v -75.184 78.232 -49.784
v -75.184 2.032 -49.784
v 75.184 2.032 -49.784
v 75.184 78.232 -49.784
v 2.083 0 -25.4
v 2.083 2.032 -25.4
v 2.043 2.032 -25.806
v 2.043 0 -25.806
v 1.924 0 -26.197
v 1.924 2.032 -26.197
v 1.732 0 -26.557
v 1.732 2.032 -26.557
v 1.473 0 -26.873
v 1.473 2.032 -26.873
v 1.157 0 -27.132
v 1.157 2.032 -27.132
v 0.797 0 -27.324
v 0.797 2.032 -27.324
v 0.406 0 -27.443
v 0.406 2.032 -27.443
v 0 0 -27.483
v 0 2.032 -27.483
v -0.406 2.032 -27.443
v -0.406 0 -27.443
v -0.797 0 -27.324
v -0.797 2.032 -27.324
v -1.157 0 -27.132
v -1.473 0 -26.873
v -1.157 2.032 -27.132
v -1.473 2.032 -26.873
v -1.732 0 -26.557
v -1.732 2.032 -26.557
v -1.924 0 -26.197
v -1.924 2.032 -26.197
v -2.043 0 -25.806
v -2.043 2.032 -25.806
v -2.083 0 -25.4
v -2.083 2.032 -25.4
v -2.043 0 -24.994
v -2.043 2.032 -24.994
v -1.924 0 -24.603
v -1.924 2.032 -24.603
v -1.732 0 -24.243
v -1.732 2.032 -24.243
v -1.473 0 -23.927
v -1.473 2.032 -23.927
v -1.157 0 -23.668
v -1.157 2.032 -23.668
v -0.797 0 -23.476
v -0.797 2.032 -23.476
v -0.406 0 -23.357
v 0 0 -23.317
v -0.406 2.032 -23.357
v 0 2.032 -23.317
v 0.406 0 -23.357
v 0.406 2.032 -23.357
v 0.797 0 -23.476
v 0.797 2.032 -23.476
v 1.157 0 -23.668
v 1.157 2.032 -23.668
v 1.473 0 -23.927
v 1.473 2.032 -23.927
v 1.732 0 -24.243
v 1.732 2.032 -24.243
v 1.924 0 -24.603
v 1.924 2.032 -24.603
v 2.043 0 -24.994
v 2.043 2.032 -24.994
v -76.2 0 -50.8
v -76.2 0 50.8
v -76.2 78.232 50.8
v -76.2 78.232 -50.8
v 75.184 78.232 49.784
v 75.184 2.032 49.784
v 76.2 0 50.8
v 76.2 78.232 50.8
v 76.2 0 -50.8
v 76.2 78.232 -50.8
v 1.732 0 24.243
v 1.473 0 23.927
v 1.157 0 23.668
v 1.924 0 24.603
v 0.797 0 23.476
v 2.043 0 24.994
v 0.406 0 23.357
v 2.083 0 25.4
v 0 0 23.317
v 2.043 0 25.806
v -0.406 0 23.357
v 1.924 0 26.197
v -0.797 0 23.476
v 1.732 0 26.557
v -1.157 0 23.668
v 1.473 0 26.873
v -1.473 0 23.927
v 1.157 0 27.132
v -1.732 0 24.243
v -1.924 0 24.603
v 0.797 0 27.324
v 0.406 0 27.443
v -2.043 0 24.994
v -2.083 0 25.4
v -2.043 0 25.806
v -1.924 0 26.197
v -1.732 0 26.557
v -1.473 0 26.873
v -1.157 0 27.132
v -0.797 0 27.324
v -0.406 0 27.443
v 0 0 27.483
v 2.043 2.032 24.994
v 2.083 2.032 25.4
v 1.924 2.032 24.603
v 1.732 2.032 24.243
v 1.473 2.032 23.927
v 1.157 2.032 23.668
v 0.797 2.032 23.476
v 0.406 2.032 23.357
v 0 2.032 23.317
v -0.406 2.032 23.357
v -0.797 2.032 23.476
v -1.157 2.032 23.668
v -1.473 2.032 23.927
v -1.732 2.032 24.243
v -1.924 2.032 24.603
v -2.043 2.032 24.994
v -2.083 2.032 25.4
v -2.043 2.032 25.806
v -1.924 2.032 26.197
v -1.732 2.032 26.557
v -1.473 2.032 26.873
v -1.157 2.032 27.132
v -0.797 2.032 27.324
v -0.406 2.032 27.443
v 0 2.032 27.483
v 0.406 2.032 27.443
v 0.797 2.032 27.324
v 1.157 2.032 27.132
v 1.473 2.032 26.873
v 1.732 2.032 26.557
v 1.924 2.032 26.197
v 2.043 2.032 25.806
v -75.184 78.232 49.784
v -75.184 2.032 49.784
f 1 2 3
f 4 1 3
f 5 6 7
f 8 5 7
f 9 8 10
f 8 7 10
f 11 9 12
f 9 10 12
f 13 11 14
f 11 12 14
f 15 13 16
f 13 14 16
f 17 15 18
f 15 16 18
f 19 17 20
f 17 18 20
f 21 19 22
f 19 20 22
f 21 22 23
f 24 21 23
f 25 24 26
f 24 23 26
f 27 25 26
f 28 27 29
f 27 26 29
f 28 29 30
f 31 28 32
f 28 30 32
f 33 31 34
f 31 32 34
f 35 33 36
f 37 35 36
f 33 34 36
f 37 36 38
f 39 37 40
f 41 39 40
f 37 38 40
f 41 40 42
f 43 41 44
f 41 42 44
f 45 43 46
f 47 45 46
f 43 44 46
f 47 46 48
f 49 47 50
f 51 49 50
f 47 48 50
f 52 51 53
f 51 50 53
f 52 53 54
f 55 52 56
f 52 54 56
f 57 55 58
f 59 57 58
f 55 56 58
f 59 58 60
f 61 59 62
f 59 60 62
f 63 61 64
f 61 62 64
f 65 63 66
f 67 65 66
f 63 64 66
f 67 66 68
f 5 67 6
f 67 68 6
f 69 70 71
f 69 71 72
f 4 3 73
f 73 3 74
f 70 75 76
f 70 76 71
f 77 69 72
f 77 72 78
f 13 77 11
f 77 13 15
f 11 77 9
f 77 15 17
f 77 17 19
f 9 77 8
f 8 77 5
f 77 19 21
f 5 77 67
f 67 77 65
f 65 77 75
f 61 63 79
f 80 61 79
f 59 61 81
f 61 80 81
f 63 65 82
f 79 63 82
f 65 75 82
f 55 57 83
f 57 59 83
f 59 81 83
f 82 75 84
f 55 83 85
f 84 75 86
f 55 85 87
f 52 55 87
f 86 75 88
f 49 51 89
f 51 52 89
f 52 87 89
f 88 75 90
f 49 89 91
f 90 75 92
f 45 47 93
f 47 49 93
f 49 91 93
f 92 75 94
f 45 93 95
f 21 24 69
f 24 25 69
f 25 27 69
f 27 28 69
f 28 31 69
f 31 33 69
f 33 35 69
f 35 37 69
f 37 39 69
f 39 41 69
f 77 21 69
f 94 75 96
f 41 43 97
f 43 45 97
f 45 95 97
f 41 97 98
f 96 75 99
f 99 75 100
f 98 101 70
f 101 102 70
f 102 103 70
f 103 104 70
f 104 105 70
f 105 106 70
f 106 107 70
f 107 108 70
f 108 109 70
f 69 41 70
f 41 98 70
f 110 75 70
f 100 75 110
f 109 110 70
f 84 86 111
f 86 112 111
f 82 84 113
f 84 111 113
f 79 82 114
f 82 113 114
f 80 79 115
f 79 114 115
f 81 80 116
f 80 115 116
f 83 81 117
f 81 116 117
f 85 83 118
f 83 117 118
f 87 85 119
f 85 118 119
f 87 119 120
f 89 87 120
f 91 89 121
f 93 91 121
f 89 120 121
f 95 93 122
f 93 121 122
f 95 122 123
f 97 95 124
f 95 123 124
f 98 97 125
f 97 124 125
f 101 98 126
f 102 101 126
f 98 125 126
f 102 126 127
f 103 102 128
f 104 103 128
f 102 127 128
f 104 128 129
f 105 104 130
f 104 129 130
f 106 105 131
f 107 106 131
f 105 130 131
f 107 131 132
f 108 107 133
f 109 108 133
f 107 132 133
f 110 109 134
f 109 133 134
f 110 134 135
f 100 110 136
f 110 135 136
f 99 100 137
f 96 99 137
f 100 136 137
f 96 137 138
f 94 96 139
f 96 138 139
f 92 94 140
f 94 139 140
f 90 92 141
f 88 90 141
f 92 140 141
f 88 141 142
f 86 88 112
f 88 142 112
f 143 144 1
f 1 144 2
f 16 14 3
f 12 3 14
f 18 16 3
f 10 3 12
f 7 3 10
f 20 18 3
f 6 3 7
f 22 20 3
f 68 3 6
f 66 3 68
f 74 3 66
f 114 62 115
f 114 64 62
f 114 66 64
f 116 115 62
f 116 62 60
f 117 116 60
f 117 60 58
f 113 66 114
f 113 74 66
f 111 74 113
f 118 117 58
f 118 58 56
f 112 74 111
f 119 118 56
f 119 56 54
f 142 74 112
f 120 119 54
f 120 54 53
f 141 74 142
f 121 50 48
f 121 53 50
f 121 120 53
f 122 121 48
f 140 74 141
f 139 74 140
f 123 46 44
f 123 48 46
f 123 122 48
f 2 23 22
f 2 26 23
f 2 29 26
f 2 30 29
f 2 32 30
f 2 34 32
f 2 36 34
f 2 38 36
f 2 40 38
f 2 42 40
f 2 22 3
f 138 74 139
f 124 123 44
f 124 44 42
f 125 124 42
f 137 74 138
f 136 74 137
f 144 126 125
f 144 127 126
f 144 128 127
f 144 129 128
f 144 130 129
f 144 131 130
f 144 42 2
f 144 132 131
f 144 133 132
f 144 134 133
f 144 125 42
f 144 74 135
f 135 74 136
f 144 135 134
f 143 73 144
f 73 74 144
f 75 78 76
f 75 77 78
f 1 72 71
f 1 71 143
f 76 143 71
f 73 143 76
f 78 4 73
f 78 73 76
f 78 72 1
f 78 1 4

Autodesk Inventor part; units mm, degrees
ref_plane "YZ Plane" through (0, 0, 0) normal (1, 0, 0) x (0, 1, 0)
ref_plane "XZ Plane" through (0, 0, 0) normal (0, 1, 0) x (-1, 0, 0)
ref_plane "XY Plane" through (0, 0, 0) normal (0, 0, 1) x (1, 0, 0)
sketch "Sketch1" plane through (0, 0, 0) normal (0, 1, 0) x (-1, 0, 0)
  line L0 (-76.2, 50.8) -> (76.2, 50.8)
  line L1 (76.2, 50.8) -> (76.2, -50.8)
  line L2 (76.2, -50.8) -> (-76.2, -50.8)
  line L3 (-76.2, -50.8) -> (-76.2, 50.8)
  line L4 (-76.2, 50.8) -> (76.2, -50.8) construction
  line L5 (76.2, 50.8) -> (-76.2, -50.8) construction
  point P0 (0, 0)
  dimension "d0" = 152.4
  dimension "d1" = 101.6
extrude "Extrusion1" add sketch "Sketch1" along normal blind 2.032
sketch "Sketch2" plane through (0, 2.032, 0) normal (0, 1, 0) x (1, 0, 0)
  line L0 (-76.2, -50.8) -> (76.2, -50.8) projected
  line L1 (76.2, -50.8) -> (76.2, 50.8) projected
  line L2 (-76.2, -50.8) -> (76.2, -50.8)
  line L3 (76.2, -50.8) -> (76.2, 50.8)
  line L4 (76.2, 50.8) -> (-76.2, 50.8)
  line L5 (-76.2, 50.8) -> (-76.2, -50.8)
  line L6 (75.184, -49.784) -> (-75.184, -49.784)
  line L7 (-75.184, -49.784) -> (-75.184, 49.784)
  line L8 (-75.184, 49.784) -> (75.184, 49.784)
  line L9 (75.184, 49.784) -> (75.184, -49.784)
  line L10 (75.184, -49.784) -> (-75.184, 49.784) construction
  line L11 (-75.184, -49.784) -> (75.184, 49.784) construction
  point P0 (0, 0)
  dimension "d4" = 150.368
  dimension "d5" = 99.568
extrude "Extrusion2" add sketch "Sketch2" along normal blind 76.2
sketch "Sketch3" plane through (0, 2.032, 0) normal (0, 1, 0) x (1, 0, 0)
  circle A0 centre (0, -25.4) radius 2.0828
  circle A1 centre (0, 25.4) radius 2.0828
  point P0 (0, 0)
  dimension "d10" = 4.1656
  dimension "d11" = 4.1656
extrude "Extrusion3" cut sketch "Sketch3" against normal through all
properties part number "546-1444-8-6x4-Enclosure"
